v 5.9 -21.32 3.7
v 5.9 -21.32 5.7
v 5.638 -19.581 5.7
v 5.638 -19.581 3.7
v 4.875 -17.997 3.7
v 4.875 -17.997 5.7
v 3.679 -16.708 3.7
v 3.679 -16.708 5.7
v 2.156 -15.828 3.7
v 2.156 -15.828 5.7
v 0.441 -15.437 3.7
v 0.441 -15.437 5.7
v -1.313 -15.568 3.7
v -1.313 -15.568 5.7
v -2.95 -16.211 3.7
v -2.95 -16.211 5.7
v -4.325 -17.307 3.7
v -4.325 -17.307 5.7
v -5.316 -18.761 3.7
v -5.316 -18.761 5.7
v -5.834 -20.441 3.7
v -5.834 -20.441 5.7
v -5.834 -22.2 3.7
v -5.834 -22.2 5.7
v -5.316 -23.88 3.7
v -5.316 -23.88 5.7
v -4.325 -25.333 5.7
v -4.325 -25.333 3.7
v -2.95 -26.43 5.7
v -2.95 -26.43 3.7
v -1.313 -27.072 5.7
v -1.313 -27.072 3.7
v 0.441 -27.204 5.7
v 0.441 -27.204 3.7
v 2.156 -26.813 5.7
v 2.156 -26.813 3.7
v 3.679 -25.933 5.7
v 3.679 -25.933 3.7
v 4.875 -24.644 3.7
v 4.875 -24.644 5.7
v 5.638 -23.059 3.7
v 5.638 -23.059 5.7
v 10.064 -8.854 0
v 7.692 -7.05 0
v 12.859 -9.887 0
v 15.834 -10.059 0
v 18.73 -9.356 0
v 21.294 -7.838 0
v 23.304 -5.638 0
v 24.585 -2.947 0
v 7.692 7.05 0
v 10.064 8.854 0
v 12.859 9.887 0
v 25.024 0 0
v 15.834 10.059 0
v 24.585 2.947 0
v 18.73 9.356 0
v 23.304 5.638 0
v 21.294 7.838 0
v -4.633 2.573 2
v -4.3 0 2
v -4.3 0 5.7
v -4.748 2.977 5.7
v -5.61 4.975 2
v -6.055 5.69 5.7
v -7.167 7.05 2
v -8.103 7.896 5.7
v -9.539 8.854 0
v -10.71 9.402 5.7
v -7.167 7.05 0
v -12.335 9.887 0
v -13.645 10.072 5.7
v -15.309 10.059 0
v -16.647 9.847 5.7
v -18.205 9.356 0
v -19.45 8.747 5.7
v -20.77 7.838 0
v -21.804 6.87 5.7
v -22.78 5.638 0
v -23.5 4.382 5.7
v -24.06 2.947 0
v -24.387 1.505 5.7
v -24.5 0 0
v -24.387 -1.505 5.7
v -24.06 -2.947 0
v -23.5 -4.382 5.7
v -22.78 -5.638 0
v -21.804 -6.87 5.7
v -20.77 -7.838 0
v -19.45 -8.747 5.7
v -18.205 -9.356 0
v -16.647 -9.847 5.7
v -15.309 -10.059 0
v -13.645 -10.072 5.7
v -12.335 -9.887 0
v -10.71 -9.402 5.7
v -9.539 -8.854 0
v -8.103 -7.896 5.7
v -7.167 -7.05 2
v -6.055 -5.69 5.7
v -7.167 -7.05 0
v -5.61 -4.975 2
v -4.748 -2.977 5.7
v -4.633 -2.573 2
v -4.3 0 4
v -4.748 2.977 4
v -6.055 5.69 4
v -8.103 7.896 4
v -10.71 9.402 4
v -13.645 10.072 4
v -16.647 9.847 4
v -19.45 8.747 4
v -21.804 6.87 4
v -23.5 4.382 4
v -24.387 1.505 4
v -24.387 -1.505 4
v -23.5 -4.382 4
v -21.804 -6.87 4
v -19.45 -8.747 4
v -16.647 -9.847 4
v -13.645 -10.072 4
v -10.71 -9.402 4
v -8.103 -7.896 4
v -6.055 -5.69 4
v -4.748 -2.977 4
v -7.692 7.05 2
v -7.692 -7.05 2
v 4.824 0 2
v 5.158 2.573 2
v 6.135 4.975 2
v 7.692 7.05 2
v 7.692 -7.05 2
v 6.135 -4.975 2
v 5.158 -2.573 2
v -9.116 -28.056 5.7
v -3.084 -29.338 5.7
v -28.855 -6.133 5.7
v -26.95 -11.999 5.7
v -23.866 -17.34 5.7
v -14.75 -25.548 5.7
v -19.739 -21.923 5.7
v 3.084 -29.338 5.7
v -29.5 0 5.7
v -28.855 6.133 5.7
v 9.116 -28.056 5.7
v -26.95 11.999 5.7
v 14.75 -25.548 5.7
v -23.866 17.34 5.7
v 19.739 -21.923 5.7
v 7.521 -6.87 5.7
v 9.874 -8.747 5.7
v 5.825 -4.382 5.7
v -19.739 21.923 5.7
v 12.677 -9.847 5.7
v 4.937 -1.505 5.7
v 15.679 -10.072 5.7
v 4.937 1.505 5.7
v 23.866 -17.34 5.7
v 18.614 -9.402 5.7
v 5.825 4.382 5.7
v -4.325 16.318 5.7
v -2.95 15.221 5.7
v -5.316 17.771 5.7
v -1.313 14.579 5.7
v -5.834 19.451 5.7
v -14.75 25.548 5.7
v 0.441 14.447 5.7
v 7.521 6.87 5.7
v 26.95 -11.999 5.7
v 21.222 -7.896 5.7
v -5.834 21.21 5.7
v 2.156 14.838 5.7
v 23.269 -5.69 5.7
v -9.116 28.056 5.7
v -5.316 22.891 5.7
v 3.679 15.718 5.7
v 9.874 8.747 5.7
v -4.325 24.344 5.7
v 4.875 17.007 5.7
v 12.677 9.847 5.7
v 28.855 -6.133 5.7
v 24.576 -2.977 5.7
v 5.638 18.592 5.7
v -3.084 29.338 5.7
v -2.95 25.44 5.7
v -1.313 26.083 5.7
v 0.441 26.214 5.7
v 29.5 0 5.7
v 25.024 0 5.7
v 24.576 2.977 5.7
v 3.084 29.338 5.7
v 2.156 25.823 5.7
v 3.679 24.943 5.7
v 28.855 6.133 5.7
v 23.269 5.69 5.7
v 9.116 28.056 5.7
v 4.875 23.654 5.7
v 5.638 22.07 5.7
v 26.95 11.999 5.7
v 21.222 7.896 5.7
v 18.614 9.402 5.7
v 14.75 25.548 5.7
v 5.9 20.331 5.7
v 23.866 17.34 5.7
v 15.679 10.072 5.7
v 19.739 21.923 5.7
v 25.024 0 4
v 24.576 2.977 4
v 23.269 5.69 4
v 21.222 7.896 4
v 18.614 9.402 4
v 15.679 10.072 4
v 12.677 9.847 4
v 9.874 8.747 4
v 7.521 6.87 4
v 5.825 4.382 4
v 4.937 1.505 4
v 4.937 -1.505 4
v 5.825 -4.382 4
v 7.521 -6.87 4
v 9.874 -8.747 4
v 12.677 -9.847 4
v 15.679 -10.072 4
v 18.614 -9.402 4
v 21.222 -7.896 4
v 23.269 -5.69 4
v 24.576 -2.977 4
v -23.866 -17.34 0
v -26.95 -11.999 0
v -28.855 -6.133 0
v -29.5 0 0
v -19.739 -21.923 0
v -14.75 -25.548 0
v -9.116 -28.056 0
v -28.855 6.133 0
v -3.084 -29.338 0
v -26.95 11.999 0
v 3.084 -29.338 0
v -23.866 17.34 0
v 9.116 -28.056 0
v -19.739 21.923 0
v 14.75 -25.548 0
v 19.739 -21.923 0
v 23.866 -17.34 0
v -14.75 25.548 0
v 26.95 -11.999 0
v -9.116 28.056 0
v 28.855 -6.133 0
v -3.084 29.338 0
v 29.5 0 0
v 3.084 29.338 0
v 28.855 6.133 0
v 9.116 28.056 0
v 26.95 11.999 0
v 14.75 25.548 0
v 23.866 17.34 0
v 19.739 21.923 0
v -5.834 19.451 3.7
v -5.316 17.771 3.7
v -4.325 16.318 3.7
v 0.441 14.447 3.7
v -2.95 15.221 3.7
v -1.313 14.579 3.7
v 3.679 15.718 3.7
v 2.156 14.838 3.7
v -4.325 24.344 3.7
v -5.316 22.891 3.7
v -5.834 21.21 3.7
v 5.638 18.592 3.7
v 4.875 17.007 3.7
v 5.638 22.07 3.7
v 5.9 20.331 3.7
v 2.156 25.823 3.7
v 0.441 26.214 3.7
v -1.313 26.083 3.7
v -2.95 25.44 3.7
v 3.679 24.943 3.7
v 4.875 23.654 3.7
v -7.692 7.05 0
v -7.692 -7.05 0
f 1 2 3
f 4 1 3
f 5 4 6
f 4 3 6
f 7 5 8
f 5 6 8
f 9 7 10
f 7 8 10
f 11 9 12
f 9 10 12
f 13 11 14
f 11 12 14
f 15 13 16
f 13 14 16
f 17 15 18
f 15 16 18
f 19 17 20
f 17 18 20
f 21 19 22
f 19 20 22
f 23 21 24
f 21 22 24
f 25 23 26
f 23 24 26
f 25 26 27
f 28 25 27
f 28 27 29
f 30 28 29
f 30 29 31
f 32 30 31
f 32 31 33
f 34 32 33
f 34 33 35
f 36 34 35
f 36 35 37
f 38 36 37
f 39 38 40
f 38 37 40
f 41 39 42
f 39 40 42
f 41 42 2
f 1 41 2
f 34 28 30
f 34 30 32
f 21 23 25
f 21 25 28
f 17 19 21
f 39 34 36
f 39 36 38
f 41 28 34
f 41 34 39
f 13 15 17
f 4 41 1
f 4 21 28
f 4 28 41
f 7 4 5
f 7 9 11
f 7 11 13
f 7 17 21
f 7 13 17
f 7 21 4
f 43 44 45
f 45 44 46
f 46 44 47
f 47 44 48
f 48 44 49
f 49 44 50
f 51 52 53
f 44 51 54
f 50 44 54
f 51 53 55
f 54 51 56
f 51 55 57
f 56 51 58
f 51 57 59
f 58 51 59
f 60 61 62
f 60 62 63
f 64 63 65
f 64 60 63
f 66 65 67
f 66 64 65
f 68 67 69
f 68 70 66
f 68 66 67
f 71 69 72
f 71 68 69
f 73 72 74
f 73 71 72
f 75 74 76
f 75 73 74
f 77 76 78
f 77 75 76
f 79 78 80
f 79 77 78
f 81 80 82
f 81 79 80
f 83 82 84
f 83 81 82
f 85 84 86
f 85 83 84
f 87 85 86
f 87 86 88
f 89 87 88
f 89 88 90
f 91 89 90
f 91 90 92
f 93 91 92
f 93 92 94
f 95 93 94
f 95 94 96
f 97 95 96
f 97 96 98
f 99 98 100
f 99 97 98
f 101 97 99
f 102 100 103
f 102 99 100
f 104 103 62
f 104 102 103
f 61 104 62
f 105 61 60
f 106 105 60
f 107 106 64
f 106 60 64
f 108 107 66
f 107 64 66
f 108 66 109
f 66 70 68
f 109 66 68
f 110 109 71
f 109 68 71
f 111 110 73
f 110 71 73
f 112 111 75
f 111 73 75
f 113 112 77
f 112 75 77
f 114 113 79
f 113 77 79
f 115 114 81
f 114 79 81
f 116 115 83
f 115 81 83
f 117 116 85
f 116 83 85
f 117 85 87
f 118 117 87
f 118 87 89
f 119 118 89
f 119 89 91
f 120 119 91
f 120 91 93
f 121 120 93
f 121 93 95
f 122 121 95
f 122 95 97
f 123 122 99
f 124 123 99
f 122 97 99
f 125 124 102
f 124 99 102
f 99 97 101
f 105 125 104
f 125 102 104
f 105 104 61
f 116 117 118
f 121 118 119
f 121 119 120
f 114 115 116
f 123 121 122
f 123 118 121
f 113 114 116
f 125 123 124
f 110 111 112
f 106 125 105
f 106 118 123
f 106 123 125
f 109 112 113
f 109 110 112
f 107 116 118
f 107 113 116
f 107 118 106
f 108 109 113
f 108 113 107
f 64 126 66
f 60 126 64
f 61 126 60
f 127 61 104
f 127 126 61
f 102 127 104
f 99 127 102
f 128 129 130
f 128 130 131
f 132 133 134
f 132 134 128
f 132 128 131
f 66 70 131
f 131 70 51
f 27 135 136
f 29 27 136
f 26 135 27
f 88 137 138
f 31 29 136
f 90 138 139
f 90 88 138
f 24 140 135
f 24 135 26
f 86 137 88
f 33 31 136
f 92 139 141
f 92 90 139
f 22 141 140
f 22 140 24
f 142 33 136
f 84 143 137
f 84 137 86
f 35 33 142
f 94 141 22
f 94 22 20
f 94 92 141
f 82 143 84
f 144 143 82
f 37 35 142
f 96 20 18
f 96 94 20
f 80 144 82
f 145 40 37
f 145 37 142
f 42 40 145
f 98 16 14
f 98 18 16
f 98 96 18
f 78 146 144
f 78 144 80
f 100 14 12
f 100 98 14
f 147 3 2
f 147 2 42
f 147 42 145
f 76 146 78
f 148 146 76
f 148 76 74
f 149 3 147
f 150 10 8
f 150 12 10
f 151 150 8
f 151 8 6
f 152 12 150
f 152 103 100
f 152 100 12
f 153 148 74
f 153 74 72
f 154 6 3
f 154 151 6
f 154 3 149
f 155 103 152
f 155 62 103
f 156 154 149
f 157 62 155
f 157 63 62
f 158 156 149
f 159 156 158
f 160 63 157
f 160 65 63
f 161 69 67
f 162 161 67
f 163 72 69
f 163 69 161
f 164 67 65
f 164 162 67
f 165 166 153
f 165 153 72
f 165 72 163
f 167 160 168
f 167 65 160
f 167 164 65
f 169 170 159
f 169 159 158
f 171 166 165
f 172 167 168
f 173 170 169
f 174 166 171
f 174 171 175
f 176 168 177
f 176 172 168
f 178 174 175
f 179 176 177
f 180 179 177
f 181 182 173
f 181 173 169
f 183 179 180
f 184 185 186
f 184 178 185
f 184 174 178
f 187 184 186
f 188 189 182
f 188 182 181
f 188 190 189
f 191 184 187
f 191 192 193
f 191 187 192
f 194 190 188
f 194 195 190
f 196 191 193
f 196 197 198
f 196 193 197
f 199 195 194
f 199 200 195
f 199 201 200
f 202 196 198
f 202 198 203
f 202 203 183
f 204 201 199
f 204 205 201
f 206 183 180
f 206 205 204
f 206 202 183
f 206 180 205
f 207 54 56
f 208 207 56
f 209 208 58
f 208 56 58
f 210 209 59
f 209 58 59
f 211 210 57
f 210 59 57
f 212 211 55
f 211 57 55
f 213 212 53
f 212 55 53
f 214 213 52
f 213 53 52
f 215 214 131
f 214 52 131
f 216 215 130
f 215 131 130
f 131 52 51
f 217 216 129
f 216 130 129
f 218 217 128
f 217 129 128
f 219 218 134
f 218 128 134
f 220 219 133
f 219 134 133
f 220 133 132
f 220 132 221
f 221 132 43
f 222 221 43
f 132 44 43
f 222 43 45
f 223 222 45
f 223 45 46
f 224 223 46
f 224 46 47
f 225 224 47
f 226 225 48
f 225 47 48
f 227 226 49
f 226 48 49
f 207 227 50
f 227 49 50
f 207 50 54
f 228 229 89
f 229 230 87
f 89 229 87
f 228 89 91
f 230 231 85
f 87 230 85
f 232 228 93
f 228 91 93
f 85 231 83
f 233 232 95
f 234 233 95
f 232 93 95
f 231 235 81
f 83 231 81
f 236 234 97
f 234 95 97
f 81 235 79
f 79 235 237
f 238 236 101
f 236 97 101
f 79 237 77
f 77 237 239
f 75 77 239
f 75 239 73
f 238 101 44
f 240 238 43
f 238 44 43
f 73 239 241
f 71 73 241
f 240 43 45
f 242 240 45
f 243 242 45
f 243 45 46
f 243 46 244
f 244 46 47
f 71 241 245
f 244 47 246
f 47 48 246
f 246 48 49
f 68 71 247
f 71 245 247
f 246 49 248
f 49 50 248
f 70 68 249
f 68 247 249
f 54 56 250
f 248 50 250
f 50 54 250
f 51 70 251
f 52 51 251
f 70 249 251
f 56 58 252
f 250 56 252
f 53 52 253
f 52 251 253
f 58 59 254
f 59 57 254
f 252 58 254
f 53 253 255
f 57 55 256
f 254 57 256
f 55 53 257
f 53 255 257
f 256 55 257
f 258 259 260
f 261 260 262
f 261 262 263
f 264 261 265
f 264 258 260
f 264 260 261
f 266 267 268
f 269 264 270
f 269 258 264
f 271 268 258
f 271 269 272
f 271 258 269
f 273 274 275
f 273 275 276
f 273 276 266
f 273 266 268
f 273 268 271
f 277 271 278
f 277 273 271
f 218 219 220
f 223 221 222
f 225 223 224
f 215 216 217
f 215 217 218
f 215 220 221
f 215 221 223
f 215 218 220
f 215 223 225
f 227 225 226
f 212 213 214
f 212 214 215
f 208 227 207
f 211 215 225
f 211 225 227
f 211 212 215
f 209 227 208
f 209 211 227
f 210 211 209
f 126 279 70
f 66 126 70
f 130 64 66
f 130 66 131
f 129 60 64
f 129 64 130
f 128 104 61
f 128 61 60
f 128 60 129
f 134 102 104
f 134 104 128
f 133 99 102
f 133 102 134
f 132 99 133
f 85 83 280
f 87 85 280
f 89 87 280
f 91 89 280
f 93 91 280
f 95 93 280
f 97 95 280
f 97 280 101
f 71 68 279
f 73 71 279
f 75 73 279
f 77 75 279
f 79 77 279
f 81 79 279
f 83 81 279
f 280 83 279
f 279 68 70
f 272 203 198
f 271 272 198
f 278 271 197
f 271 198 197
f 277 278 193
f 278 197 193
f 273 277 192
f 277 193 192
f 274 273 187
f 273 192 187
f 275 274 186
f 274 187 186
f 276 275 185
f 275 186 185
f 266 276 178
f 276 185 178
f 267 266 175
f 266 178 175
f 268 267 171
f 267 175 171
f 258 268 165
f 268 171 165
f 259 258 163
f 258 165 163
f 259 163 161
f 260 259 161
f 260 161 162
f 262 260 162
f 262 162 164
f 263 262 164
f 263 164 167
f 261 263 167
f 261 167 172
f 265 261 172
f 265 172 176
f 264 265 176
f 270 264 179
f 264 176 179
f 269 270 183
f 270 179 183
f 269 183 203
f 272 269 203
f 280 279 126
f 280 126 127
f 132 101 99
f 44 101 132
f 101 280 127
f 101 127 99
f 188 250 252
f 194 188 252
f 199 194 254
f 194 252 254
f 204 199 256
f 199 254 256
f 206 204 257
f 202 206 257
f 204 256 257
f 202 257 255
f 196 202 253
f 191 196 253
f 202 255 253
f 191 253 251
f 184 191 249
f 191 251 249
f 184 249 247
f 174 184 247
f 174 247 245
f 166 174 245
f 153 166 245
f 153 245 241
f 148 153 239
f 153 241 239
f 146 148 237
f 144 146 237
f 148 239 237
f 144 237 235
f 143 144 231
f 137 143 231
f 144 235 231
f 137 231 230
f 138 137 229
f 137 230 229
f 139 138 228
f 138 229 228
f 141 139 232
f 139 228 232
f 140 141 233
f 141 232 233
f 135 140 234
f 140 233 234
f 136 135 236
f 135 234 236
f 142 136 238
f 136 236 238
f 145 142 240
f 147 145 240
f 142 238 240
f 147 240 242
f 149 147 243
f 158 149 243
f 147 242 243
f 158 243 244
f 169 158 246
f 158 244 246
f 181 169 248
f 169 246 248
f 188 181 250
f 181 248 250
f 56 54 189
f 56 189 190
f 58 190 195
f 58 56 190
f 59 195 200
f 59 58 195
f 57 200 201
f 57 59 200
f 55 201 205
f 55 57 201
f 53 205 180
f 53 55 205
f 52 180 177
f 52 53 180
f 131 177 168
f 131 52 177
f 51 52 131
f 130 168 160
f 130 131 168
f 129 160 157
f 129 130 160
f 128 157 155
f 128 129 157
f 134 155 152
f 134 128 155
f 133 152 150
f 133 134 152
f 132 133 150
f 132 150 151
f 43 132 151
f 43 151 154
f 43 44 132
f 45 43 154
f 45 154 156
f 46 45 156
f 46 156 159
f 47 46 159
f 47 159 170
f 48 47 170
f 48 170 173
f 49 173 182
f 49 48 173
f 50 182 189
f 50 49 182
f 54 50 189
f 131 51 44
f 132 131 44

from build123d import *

# Parameters (mm, degrees)
F0_R     = 10.1
F1_DEPTH = 4
F0_R_2   = 29.5
F2_DEPTH = 5.7
F3_R     = 5.9
F4_DEPTH = 2
F5_W     = 15.384078
F5_H     = 14.1
F6_DEPTH = 2


with BuildPart() as f1:
    # F0 (on Top) → F1 (new body)
    with BuildSketch(Plane.XY):
        with Locations((-14.399773, 0)):
            Circle(F0_R)
        with Locations((14.924431, 0)):
            Circle(F0_R)
    extrude(amount=F1_DEPTH)


with BuildPart() as f2:
    # F0 (on Top) → F2 (new body)
    with BuildSketch(Plane.XY):
        Circle(F0_R_2)
        with Locations((-14.399773, 0)):
            Circle(F0_R, mode=Mode.SUBTRACT)
        with Locations((14.924431, 0)):
            Circle(F0_R, mode=Mode.SUBTRACT)
    extrude(amount=F2_DEPTH)

    # F3 (on face) → F4 (cut)
    with BuildSketch(Plane.XY.offset(5.7)):
        with Locations((0, 20.330605)):
            Circle(F3_R)
        with Locations((0, -21.320417)):
            Circle(F3_R)
    extrude(amount=-F4_DEPTH, mode=Mode.SUBTRACT)


with BuildPart() as f6_tool:
    # F5 (on face) → F6 (new body)
    with BuildSketch(Plane(origin=(0, 0, 0), x_dir=(1, 0, 0), z_dir=(0, 0, -1))):
        Rectangle(F5_W, F5_H)
    extrude(amount=-F6_DEPTH)


with BuildPart() as f1_1:
    add(f1.part)

    # F6: cut by f6_tool
    add(f6_tool.part, mode=Mode.SUBTRACT)


with BuildPart() as f2_1:
    add(f2.part)

    # F6: cut by f6_tool
    add(f6_tool.part, mode=Mode.SUBTRACT)


solid = Compound([f1_1.part, f2_1.part])
